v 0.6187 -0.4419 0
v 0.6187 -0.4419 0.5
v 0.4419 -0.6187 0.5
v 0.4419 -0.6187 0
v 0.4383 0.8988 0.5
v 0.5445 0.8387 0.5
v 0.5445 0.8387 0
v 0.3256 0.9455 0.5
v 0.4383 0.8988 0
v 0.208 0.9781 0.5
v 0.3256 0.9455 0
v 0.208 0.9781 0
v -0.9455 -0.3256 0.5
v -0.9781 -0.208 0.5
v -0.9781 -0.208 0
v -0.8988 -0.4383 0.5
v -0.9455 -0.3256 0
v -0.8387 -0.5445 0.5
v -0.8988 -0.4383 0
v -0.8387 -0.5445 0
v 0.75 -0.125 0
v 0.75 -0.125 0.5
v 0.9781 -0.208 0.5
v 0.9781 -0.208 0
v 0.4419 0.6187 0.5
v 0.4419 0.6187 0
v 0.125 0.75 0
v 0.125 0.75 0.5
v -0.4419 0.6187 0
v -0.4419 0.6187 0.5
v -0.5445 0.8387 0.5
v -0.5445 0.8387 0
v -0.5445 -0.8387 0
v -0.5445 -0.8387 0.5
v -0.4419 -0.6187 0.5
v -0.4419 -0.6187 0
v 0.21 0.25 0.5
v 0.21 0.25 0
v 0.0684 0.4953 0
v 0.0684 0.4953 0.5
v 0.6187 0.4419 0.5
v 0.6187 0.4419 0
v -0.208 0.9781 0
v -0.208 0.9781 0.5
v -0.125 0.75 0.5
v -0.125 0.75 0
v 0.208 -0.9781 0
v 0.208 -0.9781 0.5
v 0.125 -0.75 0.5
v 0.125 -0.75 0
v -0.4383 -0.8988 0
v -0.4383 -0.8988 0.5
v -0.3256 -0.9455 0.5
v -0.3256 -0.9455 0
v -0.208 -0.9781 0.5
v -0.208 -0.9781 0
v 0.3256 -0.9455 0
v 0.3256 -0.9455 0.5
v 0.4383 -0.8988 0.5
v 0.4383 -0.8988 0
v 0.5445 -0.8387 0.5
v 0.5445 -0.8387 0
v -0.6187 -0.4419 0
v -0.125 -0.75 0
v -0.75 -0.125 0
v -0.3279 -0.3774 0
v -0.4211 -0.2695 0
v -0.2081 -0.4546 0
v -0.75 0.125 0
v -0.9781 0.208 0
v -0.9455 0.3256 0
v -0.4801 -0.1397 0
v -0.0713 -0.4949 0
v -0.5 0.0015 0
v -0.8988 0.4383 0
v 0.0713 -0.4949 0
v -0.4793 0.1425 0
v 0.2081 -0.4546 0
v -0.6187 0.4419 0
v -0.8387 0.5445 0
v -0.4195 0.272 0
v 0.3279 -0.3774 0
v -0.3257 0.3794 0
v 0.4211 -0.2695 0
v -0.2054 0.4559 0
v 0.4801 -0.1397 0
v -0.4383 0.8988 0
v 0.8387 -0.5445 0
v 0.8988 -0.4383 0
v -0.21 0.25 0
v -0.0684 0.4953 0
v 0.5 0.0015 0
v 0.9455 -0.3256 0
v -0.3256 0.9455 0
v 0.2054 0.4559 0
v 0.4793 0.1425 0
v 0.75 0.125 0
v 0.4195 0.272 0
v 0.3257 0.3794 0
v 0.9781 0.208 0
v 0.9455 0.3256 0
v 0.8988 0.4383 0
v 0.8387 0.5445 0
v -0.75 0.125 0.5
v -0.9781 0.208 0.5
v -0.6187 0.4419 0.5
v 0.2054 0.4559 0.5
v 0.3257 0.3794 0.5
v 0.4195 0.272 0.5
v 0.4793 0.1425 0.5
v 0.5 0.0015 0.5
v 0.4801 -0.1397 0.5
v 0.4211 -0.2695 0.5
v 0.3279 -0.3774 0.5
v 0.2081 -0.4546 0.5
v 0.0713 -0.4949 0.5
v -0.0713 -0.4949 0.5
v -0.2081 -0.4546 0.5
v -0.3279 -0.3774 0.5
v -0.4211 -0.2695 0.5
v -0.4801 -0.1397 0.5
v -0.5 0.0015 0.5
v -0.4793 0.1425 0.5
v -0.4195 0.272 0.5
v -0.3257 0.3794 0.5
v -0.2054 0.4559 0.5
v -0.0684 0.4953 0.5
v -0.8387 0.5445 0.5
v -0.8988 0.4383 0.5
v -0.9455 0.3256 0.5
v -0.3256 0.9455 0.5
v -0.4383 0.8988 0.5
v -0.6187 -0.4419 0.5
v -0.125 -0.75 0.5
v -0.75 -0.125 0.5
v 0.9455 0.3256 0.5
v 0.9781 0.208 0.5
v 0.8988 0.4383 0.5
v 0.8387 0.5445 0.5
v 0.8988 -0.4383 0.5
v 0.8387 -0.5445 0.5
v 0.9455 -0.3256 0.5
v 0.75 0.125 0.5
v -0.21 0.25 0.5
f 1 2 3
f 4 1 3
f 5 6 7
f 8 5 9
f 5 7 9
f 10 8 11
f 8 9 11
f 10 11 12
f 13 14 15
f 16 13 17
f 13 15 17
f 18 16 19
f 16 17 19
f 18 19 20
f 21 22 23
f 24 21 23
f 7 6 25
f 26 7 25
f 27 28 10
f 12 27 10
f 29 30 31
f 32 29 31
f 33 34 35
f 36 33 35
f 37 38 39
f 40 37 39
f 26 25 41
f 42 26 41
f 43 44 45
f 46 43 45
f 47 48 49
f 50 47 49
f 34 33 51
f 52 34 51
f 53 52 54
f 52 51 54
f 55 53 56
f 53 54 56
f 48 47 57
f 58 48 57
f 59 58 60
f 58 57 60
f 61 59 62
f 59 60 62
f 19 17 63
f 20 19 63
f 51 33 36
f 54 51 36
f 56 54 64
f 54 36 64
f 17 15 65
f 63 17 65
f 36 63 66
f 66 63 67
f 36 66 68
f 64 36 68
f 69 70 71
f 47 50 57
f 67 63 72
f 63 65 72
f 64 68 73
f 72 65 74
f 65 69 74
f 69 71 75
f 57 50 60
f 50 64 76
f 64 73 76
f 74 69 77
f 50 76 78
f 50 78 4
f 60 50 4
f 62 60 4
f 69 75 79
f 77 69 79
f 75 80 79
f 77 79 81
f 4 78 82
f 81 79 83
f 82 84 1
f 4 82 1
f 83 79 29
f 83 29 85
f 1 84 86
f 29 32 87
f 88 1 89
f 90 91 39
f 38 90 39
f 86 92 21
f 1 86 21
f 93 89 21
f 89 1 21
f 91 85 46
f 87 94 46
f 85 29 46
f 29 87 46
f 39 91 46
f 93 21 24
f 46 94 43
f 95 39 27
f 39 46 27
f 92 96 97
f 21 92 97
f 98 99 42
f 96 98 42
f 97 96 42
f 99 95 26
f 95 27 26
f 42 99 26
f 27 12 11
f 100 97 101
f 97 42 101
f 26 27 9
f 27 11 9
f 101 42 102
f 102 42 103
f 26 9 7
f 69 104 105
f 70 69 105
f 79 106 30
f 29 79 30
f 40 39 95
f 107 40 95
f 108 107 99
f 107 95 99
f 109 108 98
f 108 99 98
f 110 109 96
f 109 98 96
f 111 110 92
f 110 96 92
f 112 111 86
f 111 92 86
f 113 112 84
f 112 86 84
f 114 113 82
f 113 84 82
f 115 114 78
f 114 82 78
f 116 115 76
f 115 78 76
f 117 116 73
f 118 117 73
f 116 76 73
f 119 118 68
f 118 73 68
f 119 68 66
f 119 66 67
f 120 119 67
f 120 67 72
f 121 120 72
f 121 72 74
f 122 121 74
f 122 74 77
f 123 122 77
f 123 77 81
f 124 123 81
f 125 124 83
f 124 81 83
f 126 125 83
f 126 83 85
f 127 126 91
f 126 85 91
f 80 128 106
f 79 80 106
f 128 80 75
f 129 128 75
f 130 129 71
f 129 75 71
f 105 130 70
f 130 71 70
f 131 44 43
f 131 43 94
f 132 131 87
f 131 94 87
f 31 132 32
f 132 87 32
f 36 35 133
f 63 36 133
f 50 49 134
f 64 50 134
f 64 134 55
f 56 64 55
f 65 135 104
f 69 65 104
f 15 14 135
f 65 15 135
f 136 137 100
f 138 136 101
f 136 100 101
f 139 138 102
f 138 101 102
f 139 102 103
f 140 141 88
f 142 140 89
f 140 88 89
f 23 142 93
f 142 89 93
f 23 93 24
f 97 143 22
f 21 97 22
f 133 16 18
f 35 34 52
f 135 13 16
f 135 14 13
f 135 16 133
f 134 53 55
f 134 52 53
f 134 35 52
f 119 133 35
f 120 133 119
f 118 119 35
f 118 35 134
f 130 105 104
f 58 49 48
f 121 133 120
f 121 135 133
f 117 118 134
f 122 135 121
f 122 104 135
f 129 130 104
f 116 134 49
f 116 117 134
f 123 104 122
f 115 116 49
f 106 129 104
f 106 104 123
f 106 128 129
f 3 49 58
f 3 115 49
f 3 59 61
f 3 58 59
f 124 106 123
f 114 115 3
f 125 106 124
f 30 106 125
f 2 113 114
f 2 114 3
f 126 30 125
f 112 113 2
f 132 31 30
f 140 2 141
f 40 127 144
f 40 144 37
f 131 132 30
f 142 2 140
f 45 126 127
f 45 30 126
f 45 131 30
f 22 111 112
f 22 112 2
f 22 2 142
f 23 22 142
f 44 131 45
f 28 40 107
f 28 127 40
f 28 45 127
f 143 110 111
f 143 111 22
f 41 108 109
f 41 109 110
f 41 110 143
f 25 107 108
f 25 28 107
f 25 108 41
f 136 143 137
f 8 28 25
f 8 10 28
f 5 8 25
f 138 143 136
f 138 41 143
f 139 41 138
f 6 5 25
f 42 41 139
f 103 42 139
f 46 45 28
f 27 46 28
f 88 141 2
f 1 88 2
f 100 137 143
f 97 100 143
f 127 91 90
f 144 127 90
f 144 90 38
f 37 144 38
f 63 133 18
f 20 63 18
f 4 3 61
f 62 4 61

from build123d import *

# Parameters (mm, degrees)
SKETCH1_R           = 1
BOSS_EXTRUDE2_DEPTH = 0.5
CUT_EXTRUDE1_DEPTH  = 2.5
CIRPATTERN1_COUNT   = 8


with BuildPart() as part:
    # Sketch1 → Boss-Extrude2 (new body)
    with BuildSketch(Plane.XY):
        Circle(SKETCH1_R)
        with BuildLine():
            ThreePointArc((0.06837431, 0.495302891), (0, -0.5), (-0.06837431, 0.495302891))
            Line((-0.06837431, 0.495302891), (-0.21, 0.25))
            Line((-0.21, 0.25), (0, 0.25))
            Line((0, 0.25), (0.21, 0.25))
            Line((0.21, 0.25), (0.06837431, 0.495302891))
        make_face(mode=Mode.SUBTRACT)
    extrude(amount=BOSS_EXTRUDE2_DEPTH)

    # Sketch1<4> → Cut-Extrude1 (cut, symmetric)
    with BuildSketch(Plane.XY):
        with BuildLine():
            Line((-0.125, 0.75), (0.125, 0.75))
            Line((0.125, 0.75), (0.208029796, 0.978122489))
            ThreePointArc((0.208029796, 0.978122489), (0, 1), (-0.208029796, 0.978122489))
            Line((-0.208029796, 0.978122489), (-0.125, 0.75))
        make_face()
    cut_extrude1 = extrude(amount=CUT_EXTRUDE1_DEPTH, both=True, mode=Mode.SUBTRACT)

    # CirPattern1: Cut-Extrude1 ×8 about axis
    cirpattern1_axis = Axis((0, 0, 0.5), (0, 0, -1))
    for i in range(1, CIRPATTERN1_COUNT):
        add(cut_extrude1.rotate(cirpattern1_axis, i * 360 / CIRPATTERN1_COUNT), mode=Mode.SUBTRACT)


solid = part.part
